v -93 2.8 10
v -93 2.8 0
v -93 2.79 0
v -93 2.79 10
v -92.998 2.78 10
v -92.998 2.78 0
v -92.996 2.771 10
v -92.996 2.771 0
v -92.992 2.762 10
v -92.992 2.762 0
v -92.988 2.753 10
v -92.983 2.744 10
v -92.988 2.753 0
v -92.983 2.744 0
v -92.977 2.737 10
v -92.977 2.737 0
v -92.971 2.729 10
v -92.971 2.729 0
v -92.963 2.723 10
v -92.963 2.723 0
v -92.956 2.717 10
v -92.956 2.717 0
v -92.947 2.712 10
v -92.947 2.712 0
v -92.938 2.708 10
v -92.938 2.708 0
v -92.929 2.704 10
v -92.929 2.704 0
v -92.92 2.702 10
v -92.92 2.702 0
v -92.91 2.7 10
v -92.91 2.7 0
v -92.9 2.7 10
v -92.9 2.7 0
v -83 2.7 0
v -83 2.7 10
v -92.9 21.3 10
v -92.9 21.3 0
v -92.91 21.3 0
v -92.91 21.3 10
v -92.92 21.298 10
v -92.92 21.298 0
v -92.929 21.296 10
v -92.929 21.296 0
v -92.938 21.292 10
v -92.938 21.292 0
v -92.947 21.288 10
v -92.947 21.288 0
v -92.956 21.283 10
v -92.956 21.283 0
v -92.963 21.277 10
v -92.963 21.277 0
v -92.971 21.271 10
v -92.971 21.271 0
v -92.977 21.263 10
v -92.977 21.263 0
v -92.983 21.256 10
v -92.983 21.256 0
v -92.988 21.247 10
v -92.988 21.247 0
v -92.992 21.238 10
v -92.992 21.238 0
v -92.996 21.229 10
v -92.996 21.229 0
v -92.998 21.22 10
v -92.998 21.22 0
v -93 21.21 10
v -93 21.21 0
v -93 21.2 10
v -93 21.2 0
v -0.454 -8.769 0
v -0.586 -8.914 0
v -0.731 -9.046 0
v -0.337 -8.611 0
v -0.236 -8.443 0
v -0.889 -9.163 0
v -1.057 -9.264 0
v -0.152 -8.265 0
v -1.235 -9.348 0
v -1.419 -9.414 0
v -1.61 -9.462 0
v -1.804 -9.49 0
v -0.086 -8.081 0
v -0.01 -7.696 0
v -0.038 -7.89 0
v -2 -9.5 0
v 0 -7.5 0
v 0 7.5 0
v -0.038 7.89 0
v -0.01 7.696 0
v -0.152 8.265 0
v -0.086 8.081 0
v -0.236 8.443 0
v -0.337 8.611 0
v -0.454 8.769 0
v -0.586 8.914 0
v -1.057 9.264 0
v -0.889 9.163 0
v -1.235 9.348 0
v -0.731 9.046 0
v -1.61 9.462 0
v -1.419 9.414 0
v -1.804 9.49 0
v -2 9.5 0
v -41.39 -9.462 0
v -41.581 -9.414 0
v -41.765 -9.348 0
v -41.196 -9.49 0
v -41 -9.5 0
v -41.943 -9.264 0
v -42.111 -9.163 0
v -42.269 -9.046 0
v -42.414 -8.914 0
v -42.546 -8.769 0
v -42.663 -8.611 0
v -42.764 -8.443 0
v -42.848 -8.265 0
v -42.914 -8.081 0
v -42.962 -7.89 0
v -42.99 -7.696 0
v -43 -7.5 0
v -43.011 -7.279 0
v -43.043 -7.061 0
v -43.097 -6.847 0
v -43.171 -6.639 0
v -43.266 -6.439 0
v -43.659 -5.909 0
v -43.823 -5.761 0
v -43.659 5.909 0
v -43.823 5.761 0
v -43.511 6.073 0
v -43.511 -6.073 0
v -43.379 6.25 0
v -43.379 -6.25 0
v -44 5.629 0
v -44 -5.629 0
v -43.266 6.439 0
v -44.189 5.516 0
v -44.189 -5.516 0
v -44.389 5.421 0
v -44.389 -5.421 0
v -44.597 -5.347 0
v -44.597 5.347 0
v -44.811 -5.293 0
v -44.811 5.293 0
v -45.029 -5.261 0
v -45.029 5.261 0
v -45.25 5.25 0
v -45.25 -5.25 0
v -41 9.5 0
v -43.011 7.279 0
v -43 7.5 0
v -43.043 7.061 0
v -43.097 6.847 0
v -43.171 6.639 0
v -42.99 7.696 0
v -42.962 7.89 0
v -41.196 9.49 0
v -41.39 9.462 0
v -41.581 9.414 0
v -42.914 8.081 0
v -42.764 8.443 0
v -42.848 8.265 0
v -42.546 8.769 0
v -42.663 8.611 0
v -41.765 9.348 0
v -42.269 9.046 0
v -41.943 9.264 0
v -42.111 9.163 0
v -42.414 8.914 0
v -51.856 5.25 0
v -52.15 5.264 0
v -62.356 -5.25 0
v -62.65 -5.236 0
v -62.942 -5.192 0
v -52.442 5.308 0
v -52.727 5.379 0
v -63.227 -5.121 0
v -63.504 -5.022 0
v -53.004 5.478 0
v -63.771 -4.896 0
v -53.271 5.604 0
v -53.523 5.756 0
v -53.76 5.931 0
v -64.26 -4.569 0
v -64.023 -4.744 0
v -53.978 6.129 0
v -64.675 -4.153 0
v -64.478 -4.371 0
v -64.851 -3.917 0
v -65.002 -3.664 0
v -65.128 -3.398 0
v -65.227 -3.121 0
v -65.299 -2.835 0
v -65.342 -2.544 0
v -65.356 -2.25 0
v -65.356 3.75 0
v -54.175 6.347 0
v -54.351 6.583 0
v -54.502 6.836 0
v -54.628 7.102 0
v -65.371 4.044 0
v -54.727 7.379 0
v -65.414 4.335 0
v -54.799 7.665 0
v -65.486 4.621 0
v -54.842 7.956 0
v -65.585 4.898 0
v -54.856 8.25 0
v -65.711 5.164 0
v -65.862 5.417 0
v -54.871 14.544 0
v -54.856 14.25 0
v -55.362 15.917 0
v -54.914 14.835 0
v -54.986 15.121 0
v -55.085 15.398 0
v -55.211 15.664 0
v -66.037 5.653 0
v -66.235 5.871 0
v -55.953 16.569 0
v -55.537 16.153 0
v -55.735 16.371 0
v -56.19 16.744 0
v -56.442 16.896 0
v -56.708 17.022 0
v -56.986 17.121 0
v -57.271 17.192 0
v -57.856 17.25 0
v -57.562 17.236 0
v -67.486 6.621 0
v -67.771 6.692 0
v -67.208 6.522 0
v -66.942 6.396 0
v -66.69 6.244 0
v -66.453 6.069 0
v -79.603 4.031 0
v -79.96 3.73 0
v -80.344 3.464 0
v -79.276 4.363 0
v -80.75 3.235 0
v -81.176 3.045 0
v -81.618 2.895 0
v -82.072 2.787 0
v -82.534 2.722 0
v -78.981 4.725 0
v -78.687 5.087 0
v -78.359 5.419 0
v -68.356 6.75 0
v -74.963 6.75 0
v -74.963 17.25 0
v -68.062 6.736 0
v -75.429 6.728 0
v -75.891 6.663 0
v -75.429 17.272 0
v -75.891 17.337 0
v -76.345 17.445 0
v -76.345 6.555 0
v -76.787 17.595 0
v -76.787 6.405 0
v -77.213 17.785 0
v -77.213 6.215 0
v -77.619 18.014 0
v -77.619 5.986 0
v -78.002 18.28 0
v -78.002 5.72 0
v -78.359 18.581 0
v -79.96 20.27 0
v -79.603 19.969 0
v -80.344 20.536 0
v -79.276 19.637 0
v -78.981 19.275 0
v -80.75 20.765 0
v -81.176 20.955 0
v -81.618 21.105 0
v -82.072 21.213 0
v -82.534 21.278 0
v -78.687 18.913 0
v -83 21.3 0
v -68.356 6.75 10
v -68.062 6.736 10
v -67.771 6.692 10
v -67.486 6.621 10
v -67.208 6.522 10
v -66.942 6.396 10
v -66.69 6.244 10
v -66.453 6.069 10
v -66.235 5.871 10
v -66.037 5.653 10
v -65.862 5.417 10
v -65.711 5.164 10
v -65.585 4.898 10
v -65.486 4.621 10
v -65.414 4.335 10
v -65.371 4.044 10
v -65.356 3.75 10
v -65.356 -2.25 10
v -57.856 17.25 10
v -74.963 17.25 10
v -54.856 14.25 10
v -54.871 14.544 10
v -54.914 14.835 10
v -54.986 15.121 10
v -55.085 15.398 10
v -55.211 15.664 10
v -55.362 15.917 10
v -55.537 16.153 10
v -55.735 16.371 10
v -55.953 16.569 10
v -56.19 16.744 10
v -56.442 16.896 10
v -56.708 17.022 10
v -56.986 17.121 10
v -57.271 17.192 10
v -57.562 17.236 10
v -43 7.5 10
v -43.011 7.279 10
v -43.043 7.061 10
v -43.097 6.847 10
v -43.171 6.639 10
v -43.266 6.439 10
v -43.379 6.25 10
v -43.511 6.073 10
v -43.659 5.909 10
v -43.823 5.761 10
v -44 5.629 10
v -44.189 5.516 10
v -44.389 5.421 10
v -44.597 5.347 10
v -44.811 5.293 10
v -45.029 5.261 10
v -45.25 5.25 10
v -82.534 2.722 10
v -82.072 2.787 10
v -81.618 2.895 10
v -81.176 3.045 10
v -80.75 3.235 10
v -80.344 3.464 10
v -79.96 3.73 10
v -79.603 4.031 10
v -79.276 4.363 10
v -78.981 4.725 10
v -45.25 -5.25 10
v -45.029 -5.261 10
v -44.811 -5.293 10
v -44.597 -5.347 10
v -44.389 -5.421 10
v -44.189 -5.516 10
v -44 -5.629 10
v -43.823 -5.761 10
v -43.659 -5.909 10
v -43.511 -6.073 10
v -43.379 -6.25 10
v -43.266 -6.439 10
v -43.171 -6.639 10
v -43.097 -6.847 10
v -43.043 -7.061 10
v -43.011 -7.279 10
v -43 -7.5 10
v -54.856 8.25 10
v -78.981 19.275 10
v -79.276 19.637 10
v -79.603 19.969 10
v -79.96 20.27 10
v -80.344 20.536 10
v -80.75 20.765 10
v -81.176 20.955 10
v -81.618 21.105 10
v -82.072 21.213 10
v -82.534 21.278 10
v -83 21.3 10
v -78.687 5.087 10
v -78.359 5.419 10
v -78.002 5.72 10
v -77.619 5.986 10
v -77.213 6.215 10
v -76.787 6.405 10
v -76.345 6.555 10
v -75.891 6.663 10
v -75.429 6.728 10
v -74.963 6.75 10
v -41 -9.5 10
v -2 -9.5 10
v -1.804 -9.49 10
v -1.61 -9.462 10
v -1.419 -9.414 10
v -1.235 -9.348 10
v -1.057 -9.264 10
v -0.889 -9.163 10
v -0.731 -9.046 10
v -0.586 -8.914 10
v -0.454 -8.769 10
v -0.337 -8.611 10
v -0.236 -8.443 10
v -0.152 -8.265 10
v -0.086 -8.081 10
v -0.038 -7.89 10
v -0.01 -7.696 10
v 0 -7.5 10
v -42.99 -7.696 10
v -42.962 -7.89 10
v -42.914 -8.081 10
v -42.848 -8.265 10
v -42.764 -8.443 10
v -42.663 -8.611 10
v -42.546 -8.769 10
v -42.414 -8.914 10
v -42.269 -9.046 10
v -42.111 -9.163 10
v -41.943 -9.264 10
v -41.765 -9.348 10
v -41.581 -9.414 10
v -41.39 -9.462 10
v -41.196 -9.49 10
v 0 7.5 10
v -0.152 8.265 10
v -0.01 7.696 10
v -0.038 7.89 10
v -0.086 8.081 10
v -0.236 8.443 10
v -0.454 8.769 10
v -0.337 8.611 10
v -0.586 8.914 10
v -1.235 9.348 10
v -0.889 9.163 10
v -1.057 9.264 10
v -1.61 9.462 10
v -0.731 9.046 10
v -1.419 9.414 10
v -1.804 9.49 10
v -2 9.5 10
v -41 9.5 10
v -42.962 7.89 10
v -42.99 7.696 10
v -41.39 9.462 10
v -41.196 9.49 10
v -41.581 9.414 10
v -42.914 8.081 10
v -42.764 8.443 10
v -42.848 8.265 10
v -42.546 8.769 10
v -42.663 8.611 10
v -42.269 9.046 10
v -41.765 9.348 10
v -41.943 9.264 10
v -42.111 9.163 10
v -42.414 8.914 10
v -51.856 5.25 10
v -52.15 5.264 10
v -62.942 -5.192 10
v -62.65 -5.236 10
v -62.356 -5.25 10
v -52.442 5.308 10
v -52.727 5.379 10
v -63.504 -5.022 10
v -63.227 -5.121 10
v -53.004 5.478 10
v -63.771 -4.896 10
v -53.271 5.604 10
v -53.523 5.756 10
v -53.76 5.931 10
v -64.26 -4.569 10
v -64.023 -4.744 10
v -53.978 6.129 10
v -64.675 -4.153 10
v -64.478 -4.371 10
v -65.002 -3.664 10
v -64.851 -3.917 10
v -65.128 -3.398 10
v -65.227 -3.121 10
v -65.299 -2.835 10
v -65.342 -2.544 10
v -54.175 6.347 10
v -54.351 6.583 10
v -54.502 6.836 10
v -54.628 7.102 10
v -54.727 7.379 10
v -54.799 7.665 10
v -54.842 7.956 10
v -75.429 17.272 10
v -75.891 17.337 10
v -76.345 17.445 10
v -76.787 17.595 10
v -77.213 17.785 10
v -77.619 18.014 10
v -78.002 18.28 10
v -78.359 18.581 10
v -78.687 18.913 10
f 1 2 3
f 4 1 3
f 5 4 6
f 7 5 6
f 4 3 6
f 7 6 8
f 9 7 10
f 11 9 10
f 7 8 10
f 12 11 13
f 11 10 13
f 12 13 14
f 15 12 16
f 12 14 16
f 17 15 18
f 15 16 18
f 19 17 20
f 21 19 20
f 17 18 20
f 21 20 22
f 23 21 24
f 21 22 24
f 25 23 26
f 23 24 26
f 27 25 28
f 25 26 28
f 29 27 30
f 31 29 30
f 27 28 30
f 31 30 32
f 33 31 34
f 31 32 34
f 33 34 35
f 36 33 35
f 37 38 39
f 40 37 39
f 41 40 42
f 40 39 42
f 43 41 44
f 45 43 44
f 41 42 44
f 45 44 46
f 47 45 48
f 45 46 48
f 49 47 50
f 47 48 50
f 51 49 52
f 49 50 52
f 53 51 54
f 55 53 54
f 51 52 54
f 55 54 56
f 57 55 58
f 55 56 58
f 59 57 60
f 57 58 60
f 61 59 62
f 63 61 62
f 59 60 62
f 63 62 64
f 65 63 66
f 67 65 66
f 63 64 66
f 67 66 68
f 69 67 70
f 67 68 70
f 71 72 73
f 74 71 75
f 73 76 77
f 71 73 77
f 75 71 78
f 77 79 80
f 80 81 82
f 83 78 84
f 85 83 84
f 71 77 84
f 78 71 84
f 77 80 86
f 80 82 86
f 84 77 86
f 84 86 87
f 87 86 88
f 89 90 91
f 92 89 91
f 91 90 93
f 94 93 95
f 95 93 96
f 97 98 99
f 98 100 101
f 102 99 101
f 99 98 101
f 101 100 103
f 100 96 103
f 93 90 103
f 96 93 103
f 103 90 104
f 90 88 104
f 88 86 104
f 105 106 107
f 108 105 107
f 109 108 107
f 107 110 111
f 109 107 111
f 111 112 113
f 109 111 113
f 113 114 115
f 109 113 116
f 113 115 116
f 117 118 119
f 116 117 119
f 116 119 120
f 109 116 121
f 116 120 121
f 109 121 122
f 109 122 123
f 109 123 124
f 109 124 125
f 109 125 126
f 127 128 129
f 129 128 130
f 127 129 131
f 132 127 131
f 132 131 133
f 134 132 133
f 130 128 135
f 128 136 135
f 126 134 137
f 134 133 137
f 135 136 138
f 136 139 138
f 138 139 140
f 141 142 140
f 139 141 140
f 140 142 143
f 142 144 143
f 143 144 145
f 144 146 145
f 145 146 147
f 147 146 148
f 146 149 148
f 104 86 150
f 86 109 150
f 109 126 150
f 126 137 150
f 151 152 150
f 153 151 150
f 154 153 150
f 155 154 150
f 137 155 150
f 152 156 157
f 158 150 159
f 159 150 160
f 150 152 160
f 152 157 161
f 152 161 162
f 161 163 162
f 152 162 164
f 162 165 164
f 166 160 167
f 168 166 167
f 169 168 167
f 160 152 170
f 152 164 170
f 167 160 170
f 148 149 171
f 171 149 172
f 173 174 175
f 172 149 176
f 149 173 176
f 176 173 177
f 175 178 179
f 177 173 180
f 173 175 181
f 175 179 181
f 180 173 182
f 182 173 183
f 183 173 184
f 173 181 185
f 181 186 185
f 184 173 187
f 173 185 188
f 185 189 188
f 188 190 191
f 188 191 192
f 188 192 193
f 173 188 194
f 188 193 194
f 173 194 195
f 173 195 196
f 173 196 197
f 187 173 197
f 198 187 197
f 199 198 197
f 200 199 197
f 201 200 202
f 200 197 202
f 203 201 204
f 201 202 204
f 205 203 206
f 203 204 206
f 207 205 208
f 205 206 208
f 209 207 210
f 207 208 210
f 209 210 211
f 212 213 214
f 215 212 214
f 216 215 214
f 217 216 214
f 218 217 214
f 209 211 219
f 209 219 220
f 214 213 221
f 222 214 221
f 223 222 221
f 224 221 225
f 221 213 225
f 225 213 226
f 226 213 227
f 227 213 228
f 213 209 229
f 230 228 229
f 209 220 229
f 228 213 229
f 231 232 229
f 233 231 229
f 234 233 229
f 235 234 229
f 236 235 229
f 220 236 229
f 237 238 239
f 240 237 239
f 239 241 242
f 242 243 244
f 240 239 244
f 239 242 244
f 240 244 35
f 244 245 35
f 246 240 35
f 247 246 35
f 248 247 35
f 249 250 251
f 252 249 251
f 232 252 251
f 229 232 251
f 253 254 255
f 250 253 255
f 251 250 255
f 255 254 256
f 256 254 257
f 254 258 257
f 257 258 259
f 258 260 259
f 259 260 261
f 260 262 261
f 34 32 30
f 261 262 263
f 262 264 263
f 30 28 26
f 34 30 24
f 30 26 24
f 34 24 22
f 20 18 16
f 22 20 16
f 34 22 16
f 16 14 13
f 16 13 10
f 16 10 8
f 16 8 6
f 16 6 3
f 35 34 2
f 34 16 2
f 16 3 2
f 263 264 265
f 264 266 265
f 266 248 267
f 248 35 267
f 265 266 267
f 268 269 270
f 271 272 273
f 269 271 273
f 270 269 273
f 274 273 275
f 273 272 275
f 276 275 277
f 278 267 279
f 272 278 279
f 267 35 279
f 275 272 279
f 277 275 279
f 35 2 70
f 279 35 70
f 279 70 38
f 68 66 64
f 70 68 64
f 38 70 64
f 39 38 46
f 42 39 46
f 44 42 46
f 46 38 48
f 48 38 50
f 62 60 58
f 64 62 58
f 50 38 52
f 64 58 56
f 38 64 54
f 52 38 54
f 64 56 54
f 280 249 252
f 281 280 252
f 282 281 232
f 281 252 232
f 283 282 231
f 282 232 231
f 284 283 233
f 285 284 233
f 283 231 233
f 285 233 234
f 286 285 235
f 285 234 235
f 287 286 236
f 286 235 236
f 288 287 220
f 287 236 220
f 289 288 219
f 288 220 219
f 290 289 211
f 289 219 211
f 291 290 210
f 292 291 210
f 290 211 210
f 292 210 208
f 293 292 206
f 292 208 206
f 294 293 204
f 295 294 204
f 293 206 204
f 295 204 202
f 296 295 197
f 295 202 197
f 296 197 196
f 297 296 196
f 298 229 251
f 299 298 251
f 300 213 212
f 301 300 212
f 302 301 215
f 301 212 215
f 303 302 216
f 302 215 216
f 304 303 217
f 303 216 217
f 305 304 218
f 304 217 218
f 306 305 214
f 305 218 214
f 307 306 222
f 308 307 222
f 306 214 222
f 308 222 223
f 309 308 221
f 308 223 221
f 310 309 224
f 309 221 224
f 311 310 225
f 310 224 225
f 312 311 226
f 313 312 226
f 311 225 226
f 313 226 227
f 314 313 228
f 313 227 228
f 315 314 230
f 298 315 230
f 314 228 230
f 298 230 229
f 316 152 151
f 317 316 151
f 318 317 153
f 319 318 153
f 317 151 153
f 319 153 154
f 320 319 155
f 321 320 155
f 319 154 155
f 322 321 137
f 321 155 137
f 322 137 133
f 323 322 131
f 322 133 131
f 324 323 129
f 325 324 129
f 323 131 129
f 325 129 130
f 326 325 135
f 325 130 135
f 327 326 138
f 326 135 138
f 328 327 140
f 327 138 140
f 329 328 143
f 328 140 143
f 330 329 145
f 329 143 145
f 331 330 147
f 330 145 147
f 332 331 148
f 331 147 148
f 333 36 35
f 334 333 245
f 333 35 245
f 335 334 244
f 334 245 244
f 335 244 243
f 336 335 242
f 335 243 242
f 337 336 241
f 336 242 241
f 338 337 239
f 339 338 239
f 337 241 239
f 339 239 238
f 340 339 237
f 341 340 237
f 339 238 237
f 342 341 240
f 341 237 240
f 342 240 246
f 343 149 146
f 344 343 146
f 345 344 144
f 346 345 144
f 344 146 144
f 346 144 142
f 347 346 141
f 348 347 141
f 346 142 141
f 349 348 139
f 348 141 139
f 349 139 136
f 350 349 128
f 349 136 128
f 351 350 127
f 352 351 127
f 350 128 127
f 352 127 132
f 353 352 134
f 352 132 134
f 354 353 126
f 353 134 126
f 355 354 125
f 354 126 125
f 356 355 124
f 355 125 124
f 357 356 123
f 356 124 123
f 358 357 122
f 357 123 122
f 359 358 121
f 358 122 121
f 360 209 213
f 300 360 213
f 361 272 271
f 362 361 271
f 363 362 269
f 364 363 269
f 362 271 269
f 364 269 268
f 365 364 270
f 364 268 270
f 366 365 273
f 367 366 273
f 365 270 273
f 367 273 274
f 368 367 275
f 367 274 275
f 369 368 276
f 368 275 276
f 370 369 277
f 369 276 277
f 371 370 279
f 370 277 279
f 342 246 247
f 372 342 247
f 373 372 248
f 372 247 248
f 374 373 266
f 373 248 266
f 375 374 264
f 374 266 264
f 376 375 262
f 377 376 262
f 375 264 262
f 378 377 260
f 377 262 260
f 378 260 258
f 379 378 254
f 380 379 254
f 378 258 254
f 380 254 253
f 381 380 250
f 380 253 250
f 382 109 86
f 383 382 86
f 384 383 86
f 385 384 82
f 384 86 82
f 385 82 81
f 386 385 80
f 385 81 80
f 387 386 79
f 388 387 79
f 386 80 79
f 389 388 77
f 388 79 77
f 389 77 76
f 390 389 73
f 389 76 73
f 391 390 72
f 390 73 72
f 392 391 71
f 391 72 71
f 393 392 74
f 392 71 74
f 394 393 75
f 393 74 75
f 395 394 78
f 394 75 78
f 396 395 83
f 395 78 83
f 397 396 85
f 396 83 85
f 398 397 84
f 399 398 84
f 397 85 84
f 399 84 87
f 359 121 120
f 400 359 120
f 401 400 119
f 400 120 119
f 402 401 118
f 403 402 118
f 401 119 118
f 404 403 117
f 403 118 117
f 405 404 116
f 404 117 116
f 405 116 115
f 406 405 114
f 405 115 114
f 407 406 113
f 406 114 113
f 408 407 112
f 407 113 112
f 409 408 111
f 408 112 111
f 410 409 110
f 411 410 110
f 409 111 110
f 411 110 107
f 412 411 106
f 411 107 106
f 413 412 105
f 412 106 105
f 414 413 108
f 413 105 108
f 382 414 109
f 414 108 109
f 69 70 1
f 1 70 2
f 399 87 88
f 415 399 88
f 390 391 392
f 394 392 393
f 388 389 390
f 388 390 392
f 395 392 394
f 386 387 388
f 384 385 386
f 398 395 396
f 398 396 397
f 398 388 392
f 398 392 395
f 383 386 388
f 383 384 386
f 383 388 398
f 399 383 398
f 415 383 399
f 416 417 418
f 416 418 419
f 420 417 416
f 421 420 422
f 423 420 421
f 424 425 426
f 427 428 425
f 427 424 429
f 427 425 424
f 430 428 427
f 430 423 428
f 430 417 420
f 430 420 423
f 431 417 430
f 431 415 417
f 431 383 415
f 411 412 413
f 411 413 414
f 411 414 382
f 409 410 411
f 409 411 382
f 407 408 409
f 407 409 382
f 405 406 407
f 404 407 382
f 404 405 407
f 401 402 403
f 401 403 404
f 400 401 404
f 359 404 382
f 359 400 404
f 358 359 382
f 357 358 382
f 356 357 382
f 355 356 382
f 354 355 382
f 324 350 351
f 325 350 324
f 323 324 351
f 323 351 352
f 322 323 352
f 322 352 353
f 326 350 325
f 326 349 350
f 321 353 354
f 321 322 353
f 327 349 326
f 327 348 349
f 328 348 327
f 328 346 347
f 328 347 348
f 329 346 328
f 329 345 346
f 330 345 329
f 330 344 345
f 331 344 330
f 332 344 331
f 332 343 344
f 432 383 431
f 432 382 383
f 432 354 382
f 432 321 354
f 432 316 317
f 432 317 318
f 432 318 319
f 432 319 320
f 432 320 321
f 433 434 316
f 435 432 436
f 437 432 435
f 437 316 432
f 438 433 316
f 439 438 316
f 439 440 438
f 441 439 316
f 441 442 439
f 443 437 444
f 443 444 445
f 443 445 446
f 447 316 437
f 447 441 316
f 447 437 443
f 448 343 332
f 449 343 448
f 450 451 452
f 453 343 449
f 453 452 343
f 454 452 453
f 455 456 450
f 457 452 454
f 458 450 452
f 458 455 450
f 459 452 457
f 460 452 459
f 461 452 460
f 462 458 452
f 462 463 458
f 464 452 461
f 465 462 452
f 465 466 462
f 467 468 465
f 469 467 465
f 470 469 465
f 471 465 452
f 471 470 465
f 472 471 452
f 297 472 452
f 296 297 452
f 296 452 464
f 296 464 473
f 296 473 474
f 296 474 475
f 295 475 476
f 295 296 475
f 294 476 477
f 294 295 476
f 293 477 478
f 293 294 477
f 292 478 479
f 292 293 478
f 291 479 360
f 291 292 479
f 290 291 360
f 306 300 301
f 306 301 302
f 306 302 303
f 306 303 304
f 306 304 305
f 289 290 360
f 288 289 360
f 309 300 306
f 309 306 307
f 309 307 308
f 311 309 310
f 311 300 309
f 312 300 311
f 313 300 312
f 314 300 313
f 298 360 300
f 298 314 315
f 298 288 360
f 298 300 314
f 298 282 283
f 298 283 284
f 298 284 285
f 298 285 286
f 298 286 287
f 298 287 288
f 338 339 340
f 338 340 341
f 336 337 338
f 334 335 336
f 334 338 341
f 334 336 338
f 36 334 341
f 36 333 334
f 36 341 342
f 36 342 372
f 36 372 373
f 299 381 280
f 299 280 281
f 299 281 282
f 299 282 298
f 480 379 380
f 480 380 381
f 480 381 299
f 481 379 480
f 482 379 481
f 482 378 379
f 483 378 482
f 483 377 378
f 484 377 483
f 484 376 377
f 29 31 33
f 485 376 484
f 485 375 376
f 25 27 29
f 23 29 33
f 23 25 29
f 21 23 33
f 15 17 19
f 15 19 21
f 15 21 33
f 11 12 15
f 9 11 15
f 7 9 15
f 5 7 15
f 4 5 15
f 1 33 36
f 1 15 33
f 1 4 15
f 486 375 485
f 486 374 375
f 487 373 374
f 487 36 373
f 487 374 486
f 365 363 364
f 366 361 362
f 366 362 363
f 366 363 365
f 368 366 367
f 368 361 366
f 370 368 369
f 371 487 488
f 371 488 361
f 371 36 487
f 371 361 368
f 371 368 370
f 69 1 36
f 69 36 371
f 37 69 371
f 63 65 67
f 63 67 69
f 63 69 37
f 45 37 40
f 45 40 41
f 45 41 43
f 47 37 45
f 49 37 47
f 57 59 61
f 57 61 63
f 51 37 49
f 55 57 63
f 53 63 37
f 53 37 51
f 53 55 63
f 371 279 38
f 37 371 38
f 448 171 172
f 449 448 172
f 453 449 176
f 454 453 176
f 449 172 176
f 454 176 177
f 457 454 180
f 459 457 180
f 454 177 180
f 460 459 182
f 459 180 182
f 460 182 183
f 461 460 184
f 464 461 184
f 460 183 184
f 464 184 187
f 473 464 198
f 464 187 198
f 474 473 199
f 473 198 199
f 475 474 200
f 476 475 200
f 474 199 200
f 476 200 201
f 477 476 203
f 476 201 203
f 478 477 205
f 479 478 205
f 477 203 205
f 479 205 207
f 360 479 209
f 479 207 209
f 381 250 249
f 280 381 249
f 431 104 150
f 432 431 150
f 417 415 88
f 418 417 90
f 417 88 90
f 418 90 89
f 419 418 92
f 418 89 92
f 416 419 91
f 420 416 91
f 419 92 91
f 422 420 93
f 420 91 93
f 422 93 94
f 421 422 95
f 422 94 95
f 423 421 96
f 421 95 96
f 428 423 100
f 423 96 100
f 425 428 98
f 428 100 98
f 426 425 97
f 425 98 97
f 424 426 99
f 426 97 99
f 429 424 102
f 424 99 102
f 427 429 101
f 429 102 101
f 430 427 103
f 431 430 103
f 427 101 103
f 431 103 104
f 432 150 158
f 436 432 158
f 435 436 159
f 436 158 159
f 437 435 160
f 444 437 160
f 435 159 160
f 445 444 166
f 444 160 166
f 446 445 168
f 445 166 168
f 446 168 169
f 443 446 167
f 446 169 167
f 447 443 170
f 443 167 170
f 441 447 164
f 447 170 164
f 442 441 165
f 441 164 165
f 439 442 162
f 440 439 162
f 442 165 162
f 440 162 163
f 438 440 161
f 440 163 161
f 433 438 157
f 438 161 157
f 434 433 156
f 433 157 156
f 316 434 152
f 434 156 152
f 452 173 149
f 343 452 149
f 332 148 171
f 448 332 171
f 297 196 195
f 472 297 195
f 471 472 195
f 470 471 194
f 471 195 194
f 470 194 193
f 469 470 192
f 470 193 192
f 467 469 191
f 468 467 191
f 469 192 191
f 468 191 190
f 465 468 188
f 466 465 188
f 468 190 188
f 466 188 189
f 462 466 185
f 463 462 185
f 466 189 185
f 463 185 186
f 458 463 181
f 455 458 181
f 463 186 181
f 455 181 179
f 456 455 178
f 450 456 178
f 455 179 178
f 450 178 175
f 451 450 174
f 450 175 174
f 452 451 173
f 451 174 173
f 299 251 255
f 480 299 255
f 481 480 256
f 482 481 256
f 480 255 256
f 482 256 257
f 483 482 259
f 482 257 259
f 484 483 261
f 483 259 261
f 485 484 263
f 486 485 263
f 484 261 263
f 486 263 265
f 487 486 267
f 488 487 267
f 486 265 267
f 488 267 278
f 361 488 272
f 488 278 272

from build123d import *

# Parameters (mm, degrees)
BOSS_EXTRUDE2_DEPTH = 10


with BuildPart() as part:
    # Sketch1 → Boss-Extrude2 (new body)
    with BuildSketch(Plane(origin=(0, 0, 0), x_dir=(0, 1, 0), z_dir=(0, 0, 1))):
        with BuildLine():
            Line((21.3, 83), (21.3, 92.9))
            ThreePointArc((21.3, 92.9), (21.270710678, 92.970710678), (21.2, 93))
            Line((21.2, 93), (2.8, 93))
            ThreePointArc((2.8, 93), (2.729289322, 92.970710678), (2.7, 92.9))
            Line((2.7, 92.9), (2.7, 83))
            ThreePointArc((2.7, 83), (3.234857225, 80.75), (4.725, 78.981371503))
            ThreePointArc((4.725, 78.981371503), (6.215142775, 77.212743005), (6.75, 74.962743005))
            Line((6.75, 74.962743005), (6.75, 68.356371503))
            ThreePointArc((6.75, 68.356371503), (5.871320344, 66.235051159), (3.75, 65.356371503))
            Line((3.75, 65.356371503), (-2.25, 65.356371503))
            ThreePointArc((-2.25, 65.356371503), (-4.371320344, 64.477691846), (-5.25, 62.356371503))
            Line((-5.25, 62.356371503), (-5.25, 45.25))
            ThreePointArc((-5.25, 45.25), (-5.909009742, 43.659009742), (-7.5, 43))
            ThreePointArc((-7.5, 43), (-8.914213562, 42.414213562), (-9.5, 41))
            Line((-9.5, 41), (-9.5, 2))
            ThreePointArc((-9.5, 2), (-8.914213562, 0.585786438), (-7.5, 0))
            Line((-7.5, 0), (7.5, 0))
            ThreePointArc((7.5, 0), (8.914213562, 0.585786438), (9.5, 2))
            Line((9.5, 2), (9.5, 41))
            ThreePointArc((9.5, 41), (8.914213562, 42.414213562), (7.5, 43))
            ThreePointArc((7.5, 43), (5.909009742, 43.659009742), (5.25, 45.25))
            Line((5.25, 45.25), (5.25, 51.856371503))
            ThreePointArc((5.25, 51.856371503), (6.128679656, 53.977691846), (8.25, 54.856371503))
            Line((8.25, 54.856371503), (14.25, 54.856371503))
            ThreePointArc((14.25, 54.856371503), (16.371320344, 55.735051159), (17.25, 57.856371503))
            Line((17.25, 57.856371503), (17.25, 74.962743005))
            ThreePointArc((17.25, 74.962743005), (17.784857225, 77.212743005), (19.275, 78.981371503))
            ThreePointArc((19.275, 78.981371503), (20.765142775, 80.75), (21.3, 83))
        make_face()
    extrude(amount=BOSS_EXTRUDE2_DEPTH)


solid = part.part
